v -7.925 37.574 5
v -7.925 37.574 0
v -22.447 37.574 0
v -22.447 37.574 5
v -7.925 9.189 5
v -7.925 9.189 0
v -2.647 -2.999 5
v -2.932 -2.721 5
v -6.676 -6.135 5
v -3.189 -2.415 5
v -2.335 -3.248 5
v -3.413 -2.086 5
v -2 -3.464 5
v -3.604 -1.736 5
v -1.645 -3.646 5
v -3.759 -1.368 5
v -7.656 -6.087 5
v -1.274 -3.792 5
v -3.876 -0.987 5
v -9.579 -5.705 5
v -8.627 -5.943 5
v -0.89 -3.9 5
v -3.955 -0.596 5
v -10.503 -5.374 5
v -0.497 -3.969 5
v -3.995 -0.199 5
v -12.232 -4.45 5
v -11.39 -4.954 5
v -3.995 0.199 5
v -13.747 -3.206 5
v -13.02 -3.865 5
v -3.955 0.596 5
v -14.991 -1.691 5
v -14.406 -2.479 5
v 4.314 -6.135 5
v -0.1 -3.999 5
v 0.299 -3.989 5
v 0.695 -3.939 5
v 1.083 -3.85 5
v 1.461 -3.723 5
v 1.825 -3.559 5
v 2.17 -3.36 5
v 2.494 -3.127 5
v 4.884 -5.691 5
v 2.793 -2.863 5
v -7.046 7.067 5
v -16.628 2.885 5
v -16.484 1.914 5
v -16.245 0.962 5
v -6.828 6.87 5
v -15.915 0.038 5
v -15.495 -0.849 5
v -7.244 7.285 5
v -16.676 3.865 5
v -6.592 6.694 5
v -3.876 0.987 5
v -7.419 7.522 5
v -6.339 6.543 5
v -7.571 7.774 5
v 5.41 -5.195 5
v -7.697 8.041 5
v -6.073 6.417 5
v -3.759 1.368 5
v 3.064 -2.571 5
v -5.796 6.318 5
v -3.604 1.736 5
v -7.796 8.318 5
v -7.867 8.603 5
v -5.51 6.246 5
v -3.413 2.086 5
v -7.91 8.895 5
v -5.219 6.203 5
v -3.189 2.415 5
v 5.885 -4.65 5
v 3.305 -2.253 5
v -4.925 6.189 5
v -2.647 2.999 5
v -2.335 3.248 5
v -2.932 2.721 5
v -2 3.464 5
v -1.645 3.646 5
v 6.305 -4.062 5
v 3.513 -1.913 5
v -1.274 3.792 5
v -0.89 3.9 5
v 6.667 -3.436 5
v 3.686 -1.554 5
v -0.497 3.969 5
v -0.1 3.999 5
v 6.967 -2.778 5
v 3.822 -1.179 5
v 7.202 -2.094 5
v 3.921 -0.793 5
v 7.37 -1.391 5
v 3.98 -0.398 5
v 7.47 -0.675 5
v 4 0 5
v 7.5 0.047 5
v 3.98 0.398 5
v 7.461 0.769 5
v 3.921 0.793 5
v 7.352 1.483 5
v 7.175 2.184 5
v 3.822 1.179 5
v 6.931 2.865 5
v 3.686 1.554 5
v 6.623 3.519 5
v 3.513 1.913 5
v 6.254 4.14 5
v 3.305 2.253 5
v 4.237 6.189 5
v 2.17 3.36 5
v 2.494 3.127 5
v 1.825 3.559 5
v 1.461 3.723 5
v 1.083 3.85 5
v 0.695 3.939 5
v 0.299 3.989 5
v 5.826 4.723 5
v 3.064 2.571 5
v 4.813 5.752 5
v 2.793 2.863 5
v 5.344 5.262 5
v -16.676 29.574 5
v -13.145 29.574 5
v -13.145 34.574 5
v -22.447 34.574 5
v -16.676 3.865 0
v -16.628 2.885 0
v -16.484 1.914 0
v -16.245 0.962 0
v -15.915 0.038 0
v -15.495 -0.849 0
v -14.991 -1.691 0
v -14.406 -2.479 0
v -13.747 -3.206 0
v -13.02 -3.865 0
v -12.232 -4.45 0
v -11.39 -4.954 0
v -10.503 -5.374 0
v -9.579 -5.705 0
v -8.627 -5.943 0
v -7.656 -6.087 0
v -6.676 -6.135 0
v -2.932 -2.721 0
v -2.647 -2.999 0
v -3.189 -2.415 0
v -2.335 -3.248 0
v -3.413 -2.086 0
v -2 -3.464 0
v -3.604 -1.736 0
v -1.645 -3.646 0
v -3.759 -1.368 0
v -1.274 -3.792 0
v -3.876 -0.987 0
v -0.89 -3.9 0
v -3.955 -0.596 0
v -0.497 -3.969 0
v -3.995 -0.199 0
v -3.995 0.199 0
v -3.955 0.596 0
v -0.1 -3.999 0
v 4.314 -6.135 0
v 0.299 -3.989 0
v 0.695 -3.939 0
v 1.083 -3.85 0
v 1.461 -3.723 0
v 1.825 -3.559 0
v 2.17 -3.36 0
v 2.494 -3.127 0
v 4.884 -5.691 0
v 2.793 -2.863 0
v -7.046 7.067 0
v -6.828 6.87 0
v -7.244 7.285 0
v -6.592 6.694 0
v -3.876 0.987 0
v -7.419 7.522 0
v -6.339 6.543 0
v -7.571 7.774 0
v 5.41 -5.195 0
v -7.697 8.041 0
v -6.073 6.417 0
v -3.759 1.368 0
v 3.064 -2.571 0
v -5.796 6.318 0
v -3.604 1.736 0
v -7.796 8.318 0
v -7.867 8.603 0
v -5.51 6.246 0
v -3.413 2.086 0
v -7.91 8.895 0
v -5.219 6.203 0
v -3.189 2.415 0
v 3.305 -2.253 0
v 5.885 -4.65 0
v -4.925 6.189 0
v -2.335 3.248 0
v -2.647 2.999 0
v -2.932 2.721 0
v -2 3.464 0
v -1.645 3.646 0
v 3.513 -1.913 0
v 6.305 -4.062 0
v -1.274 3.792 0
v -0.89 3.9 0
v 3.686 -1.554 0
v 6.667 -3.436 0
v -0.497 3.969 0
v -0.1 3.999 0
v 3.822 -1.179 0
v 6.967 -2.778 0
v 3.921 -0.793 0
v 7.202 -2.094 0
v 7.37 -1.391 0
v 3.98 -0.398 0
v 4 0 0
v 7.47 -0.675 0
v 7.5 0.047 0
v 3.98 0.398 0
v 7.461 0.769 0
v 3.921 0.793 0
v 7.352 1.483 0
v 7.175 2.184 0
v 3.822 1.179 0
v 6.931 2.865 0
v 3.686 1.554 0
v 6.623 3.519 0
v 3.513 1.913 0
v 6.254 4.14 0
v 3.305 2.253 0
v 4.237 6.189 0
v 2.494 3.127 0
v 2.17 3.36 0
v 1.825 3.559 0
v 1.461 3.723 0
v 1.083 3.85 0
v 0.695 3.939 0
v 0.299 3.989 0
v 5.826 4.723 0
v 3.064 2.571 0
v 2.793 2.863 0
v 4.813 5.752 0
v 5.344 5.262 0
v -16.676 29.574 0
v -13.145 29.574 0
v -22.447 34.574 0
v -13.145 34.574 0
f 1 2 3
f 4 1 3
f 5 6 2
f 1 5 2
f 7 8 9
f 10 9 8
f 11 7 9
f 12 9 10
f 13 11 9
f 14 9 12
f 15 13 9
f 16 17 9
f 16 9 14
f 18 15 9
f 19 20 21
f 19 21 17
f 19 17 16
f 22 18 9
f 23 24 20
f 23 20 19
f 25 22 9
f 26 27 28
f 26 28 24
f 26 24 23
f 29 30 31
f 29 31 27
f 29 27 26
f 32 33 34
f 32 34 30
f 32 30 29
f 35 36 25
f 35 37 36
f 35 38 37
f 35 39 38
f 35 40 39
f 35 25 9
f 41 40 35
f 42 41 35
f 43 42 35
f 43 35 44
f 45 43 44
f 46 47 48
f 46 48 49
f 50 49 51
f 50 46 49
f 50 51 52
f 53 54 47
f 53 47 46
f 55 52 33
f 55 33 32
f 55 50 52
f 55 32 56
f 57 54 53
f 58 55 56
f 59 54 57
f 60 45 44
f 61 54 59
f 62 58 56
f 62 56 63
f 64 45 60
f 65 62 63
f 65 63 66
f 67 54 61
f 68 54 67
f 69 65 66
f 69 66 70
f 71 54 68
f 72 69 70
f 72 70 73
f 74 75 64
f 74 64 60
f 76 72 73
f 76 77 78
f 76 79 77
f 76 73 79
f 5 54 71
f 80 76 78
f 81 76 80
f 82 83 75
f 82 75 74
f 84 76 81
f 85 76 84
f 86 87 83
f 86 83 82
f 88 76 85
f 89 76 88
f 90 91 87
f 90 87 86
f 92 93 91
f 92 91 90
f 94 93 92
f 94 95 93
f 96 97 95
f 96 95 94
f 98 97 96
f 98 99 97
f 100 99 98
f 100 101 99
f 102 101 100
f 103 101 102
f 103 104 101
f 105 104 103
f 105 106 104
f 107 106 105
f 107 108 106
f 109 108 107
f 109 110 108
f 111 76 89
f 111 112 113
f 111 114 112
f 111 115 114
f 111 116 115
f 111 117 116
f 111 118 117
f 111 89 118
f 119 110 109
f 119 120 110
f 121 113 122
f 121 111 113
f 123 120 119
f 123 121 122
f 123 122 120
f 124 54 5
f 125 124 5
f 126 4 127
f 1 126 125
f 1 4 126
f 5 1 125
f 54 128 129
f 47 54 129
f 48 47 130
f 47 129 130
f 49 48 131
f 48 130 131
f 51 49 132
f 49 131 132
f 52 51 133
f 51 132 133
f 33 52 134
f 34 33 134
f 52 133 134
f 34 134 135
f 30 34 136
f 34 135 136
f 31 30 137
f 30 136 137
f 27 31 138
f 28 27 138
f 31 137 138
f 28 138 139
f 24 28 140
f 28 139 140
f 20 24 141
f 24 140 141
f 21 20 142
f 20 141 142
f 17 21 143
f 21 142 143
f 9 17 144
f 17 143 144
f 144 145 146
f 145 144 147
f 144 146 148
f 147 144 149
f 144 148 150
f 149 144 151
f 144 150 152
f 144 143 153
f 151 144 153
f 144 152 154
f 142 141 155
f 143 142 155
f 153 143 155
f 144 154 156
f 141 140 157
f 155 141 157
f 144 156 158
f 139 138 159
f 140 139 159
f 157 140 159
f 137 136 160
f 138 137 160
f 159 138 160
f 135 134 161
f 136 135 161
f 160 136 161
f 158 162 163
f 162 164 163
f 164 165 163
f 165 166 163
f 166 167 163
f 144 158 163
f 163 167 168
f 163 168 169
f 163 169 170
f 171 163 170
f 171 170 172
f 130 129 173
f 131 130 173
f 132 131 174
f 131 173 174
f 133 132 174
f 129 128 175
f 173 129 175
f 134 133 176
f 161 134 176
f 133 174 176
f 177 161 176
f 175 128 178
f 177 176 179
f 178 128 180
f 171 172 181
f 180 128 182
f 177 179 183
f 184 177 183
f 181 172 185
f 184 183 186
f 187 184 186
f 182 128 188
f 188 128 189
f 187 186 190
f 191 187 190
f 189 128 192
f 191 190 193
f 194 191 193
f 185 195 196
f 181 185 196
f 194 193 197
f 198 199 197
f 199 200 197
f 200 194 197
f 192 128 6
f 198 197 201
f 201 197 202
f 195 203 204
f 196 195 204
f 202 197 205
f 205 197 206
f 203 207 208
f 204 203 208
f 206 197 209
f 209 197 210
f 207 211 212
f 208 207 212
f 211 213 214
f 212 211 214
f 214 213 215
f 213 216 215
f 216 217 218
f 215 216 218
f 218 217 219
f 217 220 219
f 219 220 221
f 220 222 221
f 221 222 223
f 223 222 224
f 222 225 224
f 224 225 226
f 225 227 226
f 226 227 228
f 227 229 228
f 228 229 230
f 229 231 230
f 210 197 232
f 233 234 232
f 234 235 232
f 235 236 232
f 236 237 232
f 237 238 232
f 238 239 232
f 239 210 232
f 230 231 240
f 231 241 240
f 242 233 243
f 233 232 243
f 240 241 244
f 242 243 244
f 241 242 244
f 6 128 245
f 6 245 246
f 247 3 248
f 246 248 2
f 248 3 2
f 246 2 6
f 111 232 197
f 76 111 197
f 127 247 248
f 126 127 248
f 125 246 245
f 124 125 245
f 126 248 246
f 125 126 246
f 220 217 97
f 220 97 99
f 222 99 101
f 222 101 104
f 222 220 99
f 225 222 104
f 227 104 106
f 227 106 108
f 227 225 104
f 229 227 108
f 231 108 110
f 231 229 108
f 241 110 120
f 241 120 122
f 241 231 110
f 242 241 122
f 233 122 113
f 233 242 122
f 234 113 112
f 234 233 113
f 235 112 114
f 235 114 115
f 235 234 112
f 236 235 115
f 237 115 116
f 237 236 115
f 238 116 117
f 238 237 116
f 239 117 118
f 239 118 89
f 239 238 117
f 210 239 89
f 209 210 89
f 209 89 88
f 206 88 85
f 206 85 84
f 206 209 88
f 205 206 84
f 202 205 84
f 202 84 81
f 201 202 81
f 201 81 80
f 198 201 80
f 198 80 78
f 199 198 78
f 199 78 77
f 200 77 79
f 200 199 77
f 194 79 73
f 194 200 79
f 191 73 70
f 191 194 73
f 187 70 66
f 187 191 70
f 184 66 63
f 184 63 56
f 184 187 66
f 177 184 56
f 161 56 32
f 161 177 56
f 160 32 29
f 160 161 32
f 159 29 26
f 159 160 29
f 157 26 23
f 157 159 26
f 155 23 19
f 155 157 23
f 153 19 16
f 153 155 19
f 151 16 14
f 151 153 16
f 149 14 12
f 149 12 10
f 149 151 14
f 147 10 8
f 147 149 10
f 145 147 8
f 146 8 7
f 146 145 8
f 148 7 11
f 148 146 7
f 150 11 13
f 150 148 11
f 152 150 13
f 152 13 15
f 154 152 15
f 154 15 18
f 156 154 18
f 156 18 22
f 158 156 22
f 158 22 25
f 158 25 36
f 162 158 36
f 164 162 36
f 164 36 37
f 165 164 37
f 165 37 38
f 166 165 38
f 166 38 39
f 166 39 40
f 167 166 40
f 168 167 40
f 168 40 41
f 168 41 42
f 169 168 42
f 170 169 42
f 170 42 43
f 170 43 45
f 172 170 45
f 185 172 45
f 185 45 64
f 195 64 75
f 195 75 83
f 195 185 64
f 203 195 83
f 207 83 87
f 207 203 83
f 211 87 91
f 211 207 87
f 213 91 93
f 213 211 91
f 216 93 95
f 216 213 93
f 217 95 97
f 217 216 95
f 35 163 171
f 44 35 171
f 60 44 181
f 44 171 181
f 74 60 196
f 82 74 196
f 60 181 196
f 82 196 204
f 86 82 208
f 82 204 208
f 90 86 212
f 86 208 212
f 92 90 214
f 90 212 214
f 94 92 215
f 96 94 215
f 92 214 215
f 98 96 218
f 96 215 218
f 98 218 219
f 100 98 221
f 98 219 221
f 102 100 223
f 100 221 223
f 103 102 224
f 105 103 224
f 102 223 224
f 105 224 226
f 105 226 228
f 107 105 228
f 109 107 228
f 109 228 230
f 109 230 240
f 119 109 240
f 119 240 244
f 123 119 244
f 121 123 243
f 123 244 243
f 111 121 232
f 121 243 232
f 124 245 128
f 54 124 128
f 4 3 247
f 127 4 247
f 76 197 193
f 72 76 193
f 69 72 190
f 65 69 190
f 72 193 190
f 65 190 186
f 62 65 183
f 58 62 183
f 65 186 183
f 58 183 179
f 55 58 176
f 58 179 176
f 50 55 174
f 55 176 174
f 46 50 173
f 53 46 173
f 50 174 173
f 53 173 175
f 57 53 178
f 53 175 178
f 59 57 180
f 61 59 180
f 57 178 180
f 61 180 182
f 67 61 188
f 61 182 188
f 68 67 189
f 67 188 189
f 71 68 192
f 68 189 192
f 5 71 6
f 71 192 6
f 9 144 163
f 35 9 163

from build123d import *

# Parameters (mm, degrees)
SKETCH_1_R      = 4
EXTRUDE_1_DEPTH = 5


with BuildPart() as part:
    # 草图1 → 凸台-拉伸1 (new body)
    with BuildSketch(Plane.XY):
        with BuildLine():
            Line((-7.924938012, 37.574342627), (-22.446516876, 37.574342627))
            Line((-22.446516876, 37.574342627), (-22.446516876, 34.574342627))
            Line((-22.446516876, 34.574342627), (-13.144515754, 34.574342627))
            Line((-13.144515754, 34.574342627), (-13.144515754, 29.574342627))
            Line((-13.144515754, 29.574342627), (-16.675920201, 29.574342627))
            Line((-16.675920201, 29.574342627), (-16.675920201, 3.864736877))
            ThreePointArc((-16.675920201, 3.864736877), (-13.746988013, -3.206330935), (-6.675920201, -6.135263123))
            Line((-6.675920201, -6.135263123), (4.313762442, -6.135263123))
            ThreePointArc((4.313762442, -6.135263123), (7.499853762, 0.046835335), (4.2368016, 6.188659968))
            Line((4.2368016, 6.188659968), (-4.924938012, 6.188659968))
            ThreePointArc((-4.924938012, 6.188659968), (-7.046258356, 7.067339624), (-7.924938012, 9.188659968))
            Line((-7.924938012, 9.188659968), (-7.924938012, 37.574342627))
        make_face()
        Circle(SKETCH_1_R, mode=Mode.SUBTRACT)
    extrude(amount=EXTRUDE_1_DEPTH)


solid = part.part
